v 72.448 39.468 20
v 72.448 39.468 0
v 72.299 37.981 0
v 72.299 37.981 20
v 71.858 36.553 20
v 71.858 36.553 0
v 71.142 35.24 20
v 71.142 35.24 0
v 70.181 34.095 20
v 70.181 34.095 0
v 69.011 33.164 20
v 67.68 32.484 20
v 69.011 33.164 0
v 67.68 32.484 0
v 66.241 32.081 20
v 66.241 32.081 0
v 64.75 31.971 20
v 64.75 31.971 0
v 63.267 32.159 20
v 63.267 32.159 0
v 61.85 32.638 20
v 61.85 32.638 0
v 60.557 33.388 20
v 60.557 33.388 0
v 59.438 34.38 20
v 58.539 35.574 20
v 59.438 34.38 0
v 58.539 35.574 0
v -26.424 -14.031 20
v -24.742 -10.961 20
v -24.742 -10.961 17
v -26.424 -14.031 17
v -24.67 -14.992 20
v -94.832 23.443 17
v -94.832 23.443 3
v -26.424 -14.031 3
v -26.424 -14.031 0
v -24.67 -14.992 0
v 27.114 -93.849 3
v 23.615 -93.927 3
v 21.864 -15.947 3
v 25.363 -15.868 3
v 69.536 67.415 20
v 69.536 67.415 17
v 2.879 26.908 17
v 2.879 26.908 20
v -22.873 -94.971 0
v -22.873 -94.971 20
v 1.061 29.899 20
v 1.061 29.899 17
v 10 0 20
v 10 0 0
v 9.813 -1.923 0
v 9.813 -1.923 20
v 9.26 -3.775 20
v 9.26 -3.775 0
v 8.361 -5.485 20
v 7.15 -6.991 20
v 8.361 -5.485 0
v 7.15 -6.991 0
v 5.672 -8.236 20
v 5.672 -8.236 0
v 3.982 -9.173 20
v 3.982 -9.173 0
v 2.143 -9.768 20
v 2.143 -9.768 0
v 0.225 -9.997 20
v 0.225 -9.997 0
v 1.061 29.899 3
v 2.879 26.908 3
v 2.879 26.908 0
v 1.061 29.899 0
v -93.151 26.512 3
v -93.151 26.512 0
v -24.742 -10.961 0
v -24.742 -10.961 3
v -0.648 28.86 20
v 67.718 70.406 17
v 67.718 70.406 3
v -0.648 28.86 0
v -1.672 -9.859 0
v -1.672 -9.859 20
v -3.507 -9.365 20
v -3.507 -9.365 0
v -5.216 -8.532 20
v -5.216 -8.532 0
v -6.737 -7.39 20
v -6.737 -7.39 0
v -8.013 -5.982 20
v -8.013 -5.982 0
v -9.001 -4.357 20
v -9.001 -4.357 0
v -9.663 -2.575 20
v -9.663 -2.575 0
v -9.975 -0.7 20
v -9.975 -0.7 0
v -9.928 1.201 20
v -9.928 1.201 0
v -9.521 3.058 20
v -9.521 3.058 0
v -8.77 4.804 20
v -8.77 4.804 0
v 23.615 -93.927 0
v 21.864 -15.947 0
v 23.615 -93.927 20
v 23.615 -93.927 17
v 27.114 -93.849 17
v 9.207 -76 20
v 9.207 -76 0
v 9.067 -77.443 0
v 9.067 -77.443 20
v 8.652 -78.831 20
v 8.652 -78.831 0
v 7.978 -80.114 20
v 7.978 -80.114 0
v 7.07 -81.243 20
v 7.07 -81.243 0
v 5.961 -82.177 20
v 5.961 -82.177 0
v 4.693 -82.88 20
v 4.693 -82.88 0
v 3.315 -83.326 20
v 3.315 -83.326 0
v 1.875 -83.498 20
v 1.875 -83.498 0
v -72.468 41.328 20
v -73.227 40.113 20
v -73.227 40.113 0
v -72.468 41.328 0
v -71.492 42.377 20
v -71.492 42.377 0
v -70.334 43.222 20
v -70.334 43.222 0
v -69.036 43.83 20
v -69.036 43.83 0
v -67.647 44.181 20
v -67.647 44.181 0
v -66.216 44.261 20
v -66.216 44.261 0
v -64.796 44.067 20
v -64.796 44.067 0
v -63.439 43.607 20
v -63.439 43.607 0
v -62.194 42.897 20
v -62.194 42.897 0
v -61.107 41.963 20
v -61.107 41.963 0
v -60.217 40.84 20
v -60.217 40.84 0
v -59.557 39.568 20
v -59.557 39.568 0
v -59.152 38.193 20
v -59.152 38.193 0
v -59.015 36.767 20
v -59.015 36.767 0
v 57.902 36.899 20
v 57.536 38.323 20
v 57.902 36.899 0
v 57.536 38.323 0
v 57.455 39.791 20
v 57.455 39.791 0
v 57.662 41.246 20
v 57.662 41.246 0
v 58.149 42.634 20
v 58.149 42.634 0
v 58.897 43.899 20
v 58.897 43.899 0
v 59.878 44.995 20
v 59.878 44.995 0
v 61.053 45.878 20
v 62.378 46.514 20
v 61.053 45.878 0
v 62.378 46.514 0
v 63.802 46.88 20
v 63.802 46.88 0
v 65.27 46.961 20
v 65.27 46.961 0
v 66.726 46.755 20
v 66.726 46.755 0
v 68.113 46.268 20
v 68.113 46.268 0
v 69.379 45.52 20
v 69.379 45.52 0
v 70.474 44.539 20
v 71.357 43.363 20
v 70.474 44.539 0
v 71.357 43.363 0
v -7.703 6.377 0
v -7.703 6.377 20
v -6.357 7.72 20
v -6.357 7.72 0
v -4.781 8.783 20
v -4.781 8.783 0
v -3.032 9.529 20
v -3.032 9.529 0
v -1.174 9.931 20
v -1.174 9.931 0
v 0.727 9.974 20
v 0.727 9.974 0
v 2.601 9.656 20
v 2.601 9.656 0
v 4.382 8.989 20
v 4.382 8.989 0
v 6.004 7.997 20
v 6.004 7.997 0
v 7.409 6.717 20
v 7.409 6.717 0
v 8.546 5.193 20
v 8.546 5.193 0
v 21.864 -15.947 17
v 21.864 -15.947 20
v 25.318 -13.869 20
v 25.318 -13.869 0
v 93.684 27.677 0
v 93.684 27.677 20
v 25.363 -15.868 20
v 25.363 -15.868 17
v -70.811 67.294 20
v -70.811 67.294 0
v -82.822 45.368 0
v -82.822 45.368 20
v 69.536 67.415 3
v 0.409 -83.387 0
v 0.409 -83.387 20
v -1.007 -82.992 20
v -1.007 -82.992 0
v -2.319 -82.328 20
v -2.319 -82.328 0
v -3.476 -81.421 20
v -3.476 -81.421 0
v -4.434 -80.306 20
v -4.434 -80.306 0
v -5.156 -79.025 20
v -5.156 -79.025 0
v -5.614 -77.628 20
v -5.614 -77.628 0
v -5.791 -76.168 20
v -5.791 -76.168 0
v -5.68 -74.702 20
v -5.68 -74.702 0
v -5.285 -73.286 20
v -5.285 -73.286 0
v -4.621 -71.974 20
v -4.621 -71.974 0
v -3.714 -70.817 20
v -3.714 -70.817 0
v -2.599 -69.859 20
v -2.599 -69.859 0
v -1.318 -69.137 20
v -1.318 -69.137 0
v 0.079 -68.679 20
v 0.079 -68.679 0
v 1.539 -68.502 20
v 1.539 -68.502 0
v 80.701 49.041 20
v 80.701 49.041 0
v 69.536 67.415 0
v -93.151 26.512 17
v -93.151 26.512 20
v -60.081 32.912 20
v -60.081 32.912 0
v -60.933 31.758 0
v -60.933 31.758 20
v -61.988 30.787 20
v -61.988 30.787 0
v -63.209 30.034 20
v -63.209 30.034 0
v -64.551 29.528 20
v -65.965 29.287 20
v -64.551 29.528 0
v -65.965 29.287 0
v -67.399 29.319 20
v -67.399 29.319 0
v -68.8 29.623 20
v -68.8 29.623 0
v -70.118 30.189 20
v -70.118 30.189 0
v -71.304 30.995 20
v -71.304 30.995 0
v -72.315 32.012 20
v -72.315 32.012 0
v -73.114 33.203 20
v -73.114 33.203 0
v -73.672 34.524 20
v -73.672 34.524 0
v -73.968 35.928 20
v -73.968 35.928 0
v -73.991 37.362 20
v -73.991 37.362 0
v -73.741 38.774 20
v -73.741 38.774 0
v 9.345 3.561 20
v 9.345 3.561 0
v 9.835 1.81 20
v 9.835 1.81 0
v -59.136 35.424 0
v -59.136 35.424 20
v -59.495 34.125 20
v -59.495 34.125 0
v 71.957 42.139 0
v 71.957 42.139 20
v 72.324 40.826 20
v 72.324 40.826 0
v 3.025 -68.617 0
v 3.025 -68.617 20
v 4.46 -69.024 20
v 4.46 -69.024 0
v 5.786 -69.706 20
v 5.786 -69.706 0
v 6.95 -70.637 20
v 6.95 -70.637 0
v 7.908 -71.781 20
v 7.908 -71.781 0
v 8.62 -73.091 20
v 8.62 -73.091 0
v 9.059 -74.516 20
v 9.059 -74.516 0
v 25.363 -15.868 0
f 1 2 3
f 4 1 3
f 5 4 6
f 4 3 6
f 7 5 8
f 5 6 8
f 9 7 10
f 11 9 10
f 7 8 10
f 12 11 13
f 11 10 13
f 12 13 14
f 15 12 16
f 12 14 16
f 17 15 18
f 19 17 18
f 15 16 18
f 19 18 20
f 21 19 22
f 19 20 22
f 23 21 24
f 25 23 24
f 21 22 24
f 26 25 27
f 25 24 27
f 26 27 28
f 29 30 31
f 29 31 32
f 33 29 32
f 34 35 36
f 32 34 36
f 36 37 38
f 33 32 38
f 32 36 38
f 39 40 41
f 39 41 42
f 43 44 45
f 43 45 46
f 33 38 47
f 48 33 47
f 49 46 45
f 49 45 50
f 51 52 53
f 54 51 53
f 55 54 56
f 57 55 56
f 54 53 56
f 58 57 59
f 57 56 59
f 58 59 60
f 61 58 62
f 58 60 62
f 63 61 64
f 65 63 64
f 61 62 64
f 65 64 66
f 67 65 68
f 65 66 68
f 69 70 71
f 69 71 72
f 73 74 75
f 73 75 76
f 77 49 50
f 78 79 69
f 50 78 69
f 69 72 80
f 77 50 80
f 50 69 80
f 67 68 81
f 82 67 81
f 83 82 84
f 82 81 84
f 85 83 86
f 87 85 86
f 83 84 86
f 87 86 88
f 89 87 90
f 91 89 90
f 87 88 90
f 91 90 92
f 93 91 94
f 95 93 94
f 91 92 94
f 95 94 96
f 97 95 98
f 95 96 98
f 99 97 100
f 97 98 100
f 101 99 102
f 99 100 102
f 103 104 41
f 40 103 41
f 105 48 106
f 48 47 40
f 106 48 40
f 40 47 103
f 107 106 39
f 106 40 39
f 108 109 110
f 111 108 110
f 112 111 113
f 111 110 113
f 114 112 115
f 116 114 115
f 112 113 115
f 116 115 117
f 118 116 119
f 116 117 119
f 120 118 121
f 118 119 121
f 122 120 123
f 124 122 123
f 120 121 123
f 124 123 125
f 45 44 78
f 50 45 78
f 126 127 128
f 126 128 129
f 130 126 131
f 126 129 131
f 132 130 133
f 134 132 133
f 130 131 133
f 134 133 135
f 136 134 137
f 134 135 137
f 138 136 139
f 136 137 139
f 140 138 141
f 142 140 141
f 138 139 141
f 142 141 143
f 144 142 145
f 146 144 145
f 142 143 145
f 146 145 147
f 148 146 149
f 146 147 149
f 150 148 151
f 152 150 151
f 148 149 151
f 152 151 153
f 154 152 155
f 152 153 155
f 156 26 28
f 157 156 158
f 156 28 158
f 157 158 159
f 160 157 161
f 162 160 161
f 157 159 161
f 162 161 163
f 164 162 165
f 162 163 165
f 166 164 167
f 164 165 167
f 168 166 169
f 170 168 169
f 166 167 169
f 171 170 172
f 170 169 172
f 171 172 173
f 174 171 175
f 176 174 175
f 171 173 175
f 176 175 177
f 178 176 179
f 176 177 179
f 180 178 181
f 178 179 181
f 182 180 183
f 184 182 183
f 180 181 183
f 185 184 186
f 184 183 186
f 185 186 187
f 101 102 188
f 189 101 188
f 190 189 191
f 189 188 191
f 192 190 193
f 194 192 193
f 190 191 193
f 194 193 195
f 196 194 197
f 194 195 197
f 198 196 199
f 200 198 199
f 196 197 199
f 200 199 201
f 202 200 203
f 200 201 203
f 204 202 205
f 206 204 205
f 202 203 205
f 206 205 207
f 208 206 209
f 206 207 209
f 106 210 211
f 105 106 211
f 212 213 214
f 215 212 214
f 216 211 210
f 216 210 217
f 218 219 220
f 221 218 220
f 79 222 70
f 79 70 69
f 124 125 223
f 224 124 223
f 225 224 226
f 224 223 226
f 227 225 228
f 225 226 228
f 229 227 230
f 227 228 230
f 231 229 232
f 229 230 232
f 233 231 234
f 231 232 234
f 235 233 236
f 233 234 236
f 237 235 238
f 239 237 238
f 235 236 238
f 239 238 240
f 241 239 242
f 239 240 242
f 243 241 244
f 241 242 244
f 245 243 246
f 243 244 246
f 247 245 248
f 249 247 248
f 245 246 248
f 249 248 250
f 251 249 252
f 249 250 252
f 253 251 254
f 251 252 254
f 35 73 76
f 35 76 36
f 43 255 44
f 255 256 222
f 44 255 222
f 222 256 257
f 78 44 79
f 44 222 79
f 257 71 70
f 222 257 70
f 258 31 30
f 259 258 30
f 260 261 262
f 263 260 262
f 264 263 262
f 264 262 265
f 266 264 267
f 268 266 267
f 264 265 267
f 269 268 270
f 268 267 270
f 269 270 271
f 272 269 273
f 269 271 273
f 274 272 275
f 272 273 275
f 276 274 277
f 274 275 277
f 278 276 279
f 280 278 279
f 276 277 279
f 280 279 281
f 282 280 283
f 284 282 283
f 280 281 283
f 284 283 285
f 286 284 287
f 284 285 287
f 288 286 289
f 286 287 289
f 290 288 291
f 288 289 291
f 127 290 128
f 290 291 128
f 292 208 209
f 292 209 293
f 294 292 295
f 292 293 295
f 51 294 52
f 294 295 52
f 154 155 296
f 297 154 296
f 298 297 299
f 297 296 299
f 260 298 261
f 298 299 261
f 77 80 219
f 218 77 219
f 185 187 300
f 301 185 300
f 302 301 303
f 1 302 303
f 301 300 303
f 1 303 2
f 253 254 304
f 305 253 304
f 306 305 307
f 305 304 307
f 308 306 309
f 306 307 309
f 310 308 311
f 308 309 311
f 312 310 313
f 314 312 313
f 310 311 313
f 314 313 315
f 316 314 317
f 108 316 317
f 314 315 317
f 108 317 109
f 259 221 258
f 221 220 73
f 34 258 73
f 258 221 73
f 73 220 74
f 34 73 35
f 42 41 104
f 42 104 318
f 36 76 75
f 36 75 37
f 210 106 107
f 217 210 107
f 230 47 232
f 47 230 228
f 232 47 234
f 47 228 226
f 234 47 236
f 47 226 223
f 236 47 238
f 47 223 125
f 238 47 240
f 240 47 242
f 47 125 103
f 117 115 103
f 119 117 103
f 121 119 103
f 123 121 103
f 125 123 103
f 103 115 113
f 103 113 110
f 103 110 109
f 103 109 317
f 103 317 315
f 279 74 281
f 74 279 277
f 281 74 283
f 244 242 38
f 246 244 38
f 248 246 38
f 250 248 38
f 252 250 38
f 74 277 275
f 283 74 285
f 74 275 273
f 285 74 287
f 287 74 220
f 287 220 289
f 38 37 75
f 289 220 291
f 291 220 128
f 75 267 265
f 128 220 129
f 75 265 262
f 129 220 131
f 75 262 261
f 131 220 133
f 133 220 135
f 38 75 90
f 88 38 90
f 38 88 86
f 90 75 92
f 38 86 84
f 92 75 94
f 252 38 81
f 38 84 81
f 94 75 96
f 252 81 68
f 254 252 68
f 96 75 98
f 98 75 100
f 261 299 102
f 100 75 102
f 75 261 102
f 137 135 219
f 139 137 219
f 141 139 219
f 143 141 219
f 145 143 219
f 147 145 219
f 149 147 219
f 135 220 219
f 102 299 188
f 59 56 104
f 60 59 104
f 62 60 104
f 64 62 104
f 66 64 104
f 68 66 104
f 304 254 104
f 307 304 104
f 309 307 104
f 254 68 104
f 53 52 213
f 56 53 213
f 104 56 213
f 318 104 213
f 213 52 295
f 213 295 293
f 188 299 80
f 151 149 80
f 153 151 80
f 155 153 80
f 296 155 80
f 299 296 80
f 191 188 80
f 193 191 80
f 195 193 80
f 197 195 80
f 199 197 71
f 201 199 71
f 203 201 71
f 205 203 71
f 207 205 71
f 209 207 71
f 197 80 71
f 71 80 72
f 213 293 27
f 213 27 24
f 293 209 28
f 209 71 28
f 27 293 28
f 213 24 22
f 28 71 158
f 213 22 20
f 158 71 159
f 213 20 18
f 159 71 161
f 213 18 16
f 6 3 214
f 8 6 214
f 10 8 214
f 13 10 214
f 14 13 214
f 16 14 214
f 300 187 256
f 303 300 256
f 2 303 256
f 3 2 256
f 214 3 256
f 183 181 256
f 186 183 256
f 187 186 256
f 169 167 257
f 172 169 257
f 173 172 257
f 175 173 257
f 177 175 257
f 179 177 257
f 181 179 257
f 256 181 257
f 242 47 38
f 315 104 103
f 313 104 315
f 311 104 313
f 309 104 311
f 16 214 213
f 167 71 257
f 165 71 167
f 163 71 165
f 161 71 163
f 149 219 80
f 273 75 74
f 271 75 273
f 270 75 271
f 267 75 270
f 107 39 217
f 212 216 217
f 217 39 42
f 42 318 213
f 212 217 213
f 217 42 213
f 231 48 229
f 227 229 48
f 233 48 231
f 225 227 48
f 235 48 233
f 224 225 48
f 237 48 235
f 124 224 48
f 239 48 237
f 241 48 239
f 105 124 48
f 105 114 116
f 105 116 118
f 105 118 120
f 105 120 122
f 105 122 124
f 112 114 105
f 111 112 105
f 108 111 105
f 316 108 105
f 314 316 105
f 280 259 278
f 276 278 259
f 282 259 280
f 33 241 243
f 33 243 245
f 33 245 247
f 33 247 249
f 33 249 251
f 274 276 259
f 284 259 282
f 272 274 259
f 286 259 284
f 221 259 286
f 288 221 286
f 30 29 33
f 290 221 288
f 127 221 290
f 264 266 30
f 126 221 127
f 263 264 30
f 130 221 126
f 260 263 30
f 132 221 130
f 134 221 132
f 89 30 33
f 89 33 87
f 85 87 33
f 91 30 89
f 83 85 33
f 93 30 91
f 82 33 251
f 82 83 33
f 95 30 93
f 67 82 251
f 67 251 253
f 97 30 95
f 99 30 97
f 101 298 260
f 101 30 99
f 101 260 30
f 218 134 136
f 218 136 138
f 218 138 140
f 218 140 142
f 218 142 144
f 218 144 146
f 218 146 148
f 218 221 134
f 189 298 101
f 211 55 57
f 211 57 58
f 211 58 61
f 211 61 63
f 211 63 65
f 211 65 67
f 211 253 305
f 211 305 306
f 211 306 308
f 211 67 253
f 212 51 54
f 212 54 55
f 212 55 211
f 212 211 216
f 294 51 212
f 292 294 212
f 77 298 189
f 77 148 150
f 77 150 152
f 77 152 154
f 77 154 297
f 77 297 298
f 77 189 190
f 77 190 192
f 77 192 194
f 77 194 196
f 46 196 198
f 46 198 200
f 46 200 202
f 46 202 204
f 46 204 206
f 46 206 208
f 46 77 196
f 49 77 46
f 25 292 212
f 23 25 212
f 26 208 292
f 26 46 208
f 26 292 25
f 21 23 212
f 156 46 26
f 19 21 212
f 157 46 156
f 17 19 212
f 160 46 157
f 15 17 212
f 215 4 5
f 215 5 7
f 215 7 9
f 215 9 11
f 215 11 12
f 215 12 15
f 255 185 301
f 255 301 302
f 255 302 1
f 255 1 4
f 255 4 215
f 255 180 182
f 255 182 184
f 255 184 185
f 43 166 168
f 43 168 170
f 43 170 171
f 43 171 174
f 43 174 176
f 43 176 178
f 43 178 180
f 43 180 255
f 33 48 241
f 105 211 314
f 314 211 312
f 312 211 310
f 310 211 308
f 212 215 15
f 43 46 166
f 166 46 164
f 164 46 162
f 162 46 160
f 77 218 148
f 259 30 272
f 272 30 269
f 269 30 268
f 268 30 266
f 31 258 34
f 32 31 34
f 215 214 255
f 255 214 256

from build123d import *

# Parameters (mm, degrees)
F1_DEPTH = 20
F2_W     = 3.5
F2_H     = 3
F3_DEPTH = 78
F4_W     = 3.5
F4_H     = 3
F5_DEPTH = 78
F6_W     = 3.5
F6_H     = 3
F7_DEPTH = 78


with BuildPart() as f1:
    # F0 (on Top) → F1 (new body)
    with BuildSketch(Plane.XY):
        with BuildLine():
            Line((58.5386705788, 35.5735020327), (12.3347873053, 7.4957558301))
            Line((12.3347873053, 7.4957558301), (25.3178172443, -13.8687224833))
            Line((25.3178172443, -13.8687224833), (93.6841478472, 27.6769733213))
            Line((93.6841478472, 27.6769733213), (80.7011179083, 49.0414516348))
            Line((80.7011179083, 49.0414516348), (71.3573575668, 43.3633199961))
            ThreePointArc((71.3573575668, 43.3633199961), (72.1702047448, 41.4907764357), (72.4480140728, 39.4684110144))
            ThreePointArc((72.4480140728, 39.4684110144), (66.9703794941, 32.2462203424), (58.5386705788, 35.5735020327))
        make_face()
        with BuildLine():
            Line((-0.6482426336, 28.8602341436), (12.3347873053, 7.4957558301))
            Line((12.3347873053, 7.4957558301), (58.5386705788, 35.5735020327))
            ThreePointArc((58.5386705788, 35.5735020327), (61.0531050911, 45.8777545084), (71.3573575668, 43.3633199961))
            Line((71.3573575668, 43.3633199961), (80.7011179083, 49.0414516348))
            Line((80.7011179083, 49.0414516348), (67.7180879693, 70.4059299482))
            Line((67.7180879693, 70.4059299482), (-0.6482426336, 28.8602341436))
        make_face()
        with BuildLine():
            Line((-24.6695746107, -14.9915116603), (-12.6589086221, 6.9343612416))
            Line((-12.6589086221, 6.9343612416), (-60.0813298697, 32.9116559437))
            ThreePointArc((-60.0813298697, 32.9116559437), (-70.1179765686, 30.1888598259), (-73.2270059229, 40.1126611203))
            Line((-73.2270059229, 40.1126611203), (-82.8217019083, 45.368492405))
            Line((-82.8217019083, 45.368492405), (-94.8323678969, 23.4426195031))
            Line((-94.8323678969, 23.4426195031), (-24.6695746107, -14.9915116603))
        make_face()
        with BuildLine():
            Line((1.5386516322, -68.5018912218), (0.3241213168, -14.4301170718))
            Line((0.3241213168, -14.4301170718), (-24.6695746107, -14.9915116603))
            Line((-24.6695746107, -14.9915116603), (-22.8731119275, -94.9713386283))
            Line((-22.8731119275, -94.9713386283), (2.120584, -94.4099440398))
            Line((2.120584, -94.4099440398), (1.8754883853, -83.4981087782))
            ThreePointArc((1.8754883853, -83.4981087782), (-5.7910387695, -76.1684183766), (1.5386516322, -68.5018912218))
        make_face()
        with BuildLine():
            Line((25.3178172443, -13.8687224833), (0.3241213168, -14.4301170718))
            Line((0.3241213168, -14.4301170718), (1.5386516322, -68.5018912218))
            ThreePointArc((1.5386516322, -68.5018912218), (6.950487891, -70.6374848334), (9.2070700088, -76))
            ThreePointArc((9.2070700088, -76), (7.0695851754, -81.2434178823), (1.8754883853, -83.4981087782))
            Line((1.8754883853, -83.4981087782), (2.120584, -94.4099440398))
            Line((2.120584, -94.4099440398), (27.1142799275, -93.8485494513))
            Line((27.1142799275, -93.8485494513), (25.3178172443, -13.8687224833))
        make_face()
        with BuildLine():
            Line((-60.0813298697, 32.9116559437), (-12.6589086221, 6.9343612416))
            Line((-12.6589086221, 6.9343612416), (-0.6482426336, 28.8602341436))
            Line((-0.6482426336, 28.8602341436), (-70.8110359198, 67.2943653069))
            Line((-70.8110359198, 67.2943653069), (-82.8217019083, 45.368492405))
            Line((-82.8217019083, 45.368492405), (-73.2270059229, 40.1126611203))
            ThreePointArc((-73.2270059229, 40.1126611203), (-64.7960153912, 44.0670230084), (-59.014776772, 36.7666216964))
            ThreePointArc((-59.014776772, 36.7666216964), (-59.2863311657, 34.7667281702), (-60.0813298697, 32.9116559437))
        make_face()
        with BuildLine():
            Line((0.3241213168, -14.4301170718), (0.2245578354, -9.997478371))
            ThreePointArc((0.2245578354, -9.997478371), (-8.5457913254, -5.1932119756), (-8.7703491608, 4.8042663954))
            Line((-8.7703491608, 4.8042663954), (-12.6589086221, 6.9343612416))
            Line((-12.6589086221, 6.9343612416), (-24.6695746107, -14.9915116603))
            Line((-24.6695746107, -14.9915116603), (0.3241213168, -14.4301170718))
        make_face()
        with BuildLine():
            ThreePointArc((-8.7703491608, 4.8042663954), (-0.2245578354, 9.997478371), (8.5457913254, 5.1932119756))
            Line((8.5457913254, 5.1932119756), (12.3347873053, 7.4957558301))
            Line((12.3347873053, 7.4957558301), (-0.6482426336, 28.8602341436))
            Line((-0.6482426336, 28.8602341436), (-12.6589086221, 6.9343612416))
            Line((-12.6589086221, 6.9343612416), (-8.7703491608, 4.8042663954))
        make_face()
        with BuildLine():
            ThreePointArc((8.5457913254, 5.1932119756), (9.6295875627, 2.6964872284), (10, 0))
            ThreePointArc((10, 0), (7.1500202221, -6.991223843), (0.2245578354, -9.997478371))
            Line((0.2245578354, -9.997478371), (0.3241213168, -14.4301170718))
            Line((0.3241213168, -14.4301170718), (25.3178172443, -13.8687224833))
            Line((25.3178172443, -13.8687224833), (12.3347873053, 7.4957558301))
            Line((12.3347873053, 7.4957558301), (8.5457913254, 5.1932119756))
        make_face()
    extrude(amount=F1_DEPTH)

    # F2 (on face) → F3 (cut)
    with BuildSketch(Plane(origin=(-82.8217019083, 45.368492405, 0), x_dir=(-0.4804266395, -0.8770349161, 0), z_dir=(-0.8770349161, 0.4804266395, 0))):
        with Locations((23.25, 18.5)):
            Rectangle(F2_W, F2_H)
        with Locations((23.25, 1.5)):
            Rectangle(F2_W, F2_H)
    extrude(amount=-F3_DEPTH, mode=Mode.SUBTRACT)

    # F4 (on face) → F5 (cut)
    with BuildSketch(Plane(origin=(2.120584, -94.4099440398, 0), x_dir=(0.9997478371, 0.0224557835, 0), z_dir=(0.0224557835, -0.9997478371, 0))):
        with Locations((23.25, 18.5)):
            Rectangle(F4_W, F4_H)
        with Locations((23.25, 1.5)):
            Rectangle(F4_W, F4_H)
    extrude(amount=-F5_DEPTH, mode=Mode.SUBTRACT)

    # F6 (on face) → F7 (cut)
    with BuildSketch(Plane(origin=(80.7011179083, 49.0414516348, 0), x_dir=(-0.5193211976, 0.8545791325, 0), z_dir=(0.8545791325, 0.5193211976, 0))):
        with Locations((23.25, 18.5)):
            Rectangle(F6_W, F6_H)
        with Locations((23.25, 1.5)):
            Rectangle(F6_W, F6_H)
    extrude(amount=-F7_DEPTH, mode=Mode.SUBTRACT)


solid = f1.part
